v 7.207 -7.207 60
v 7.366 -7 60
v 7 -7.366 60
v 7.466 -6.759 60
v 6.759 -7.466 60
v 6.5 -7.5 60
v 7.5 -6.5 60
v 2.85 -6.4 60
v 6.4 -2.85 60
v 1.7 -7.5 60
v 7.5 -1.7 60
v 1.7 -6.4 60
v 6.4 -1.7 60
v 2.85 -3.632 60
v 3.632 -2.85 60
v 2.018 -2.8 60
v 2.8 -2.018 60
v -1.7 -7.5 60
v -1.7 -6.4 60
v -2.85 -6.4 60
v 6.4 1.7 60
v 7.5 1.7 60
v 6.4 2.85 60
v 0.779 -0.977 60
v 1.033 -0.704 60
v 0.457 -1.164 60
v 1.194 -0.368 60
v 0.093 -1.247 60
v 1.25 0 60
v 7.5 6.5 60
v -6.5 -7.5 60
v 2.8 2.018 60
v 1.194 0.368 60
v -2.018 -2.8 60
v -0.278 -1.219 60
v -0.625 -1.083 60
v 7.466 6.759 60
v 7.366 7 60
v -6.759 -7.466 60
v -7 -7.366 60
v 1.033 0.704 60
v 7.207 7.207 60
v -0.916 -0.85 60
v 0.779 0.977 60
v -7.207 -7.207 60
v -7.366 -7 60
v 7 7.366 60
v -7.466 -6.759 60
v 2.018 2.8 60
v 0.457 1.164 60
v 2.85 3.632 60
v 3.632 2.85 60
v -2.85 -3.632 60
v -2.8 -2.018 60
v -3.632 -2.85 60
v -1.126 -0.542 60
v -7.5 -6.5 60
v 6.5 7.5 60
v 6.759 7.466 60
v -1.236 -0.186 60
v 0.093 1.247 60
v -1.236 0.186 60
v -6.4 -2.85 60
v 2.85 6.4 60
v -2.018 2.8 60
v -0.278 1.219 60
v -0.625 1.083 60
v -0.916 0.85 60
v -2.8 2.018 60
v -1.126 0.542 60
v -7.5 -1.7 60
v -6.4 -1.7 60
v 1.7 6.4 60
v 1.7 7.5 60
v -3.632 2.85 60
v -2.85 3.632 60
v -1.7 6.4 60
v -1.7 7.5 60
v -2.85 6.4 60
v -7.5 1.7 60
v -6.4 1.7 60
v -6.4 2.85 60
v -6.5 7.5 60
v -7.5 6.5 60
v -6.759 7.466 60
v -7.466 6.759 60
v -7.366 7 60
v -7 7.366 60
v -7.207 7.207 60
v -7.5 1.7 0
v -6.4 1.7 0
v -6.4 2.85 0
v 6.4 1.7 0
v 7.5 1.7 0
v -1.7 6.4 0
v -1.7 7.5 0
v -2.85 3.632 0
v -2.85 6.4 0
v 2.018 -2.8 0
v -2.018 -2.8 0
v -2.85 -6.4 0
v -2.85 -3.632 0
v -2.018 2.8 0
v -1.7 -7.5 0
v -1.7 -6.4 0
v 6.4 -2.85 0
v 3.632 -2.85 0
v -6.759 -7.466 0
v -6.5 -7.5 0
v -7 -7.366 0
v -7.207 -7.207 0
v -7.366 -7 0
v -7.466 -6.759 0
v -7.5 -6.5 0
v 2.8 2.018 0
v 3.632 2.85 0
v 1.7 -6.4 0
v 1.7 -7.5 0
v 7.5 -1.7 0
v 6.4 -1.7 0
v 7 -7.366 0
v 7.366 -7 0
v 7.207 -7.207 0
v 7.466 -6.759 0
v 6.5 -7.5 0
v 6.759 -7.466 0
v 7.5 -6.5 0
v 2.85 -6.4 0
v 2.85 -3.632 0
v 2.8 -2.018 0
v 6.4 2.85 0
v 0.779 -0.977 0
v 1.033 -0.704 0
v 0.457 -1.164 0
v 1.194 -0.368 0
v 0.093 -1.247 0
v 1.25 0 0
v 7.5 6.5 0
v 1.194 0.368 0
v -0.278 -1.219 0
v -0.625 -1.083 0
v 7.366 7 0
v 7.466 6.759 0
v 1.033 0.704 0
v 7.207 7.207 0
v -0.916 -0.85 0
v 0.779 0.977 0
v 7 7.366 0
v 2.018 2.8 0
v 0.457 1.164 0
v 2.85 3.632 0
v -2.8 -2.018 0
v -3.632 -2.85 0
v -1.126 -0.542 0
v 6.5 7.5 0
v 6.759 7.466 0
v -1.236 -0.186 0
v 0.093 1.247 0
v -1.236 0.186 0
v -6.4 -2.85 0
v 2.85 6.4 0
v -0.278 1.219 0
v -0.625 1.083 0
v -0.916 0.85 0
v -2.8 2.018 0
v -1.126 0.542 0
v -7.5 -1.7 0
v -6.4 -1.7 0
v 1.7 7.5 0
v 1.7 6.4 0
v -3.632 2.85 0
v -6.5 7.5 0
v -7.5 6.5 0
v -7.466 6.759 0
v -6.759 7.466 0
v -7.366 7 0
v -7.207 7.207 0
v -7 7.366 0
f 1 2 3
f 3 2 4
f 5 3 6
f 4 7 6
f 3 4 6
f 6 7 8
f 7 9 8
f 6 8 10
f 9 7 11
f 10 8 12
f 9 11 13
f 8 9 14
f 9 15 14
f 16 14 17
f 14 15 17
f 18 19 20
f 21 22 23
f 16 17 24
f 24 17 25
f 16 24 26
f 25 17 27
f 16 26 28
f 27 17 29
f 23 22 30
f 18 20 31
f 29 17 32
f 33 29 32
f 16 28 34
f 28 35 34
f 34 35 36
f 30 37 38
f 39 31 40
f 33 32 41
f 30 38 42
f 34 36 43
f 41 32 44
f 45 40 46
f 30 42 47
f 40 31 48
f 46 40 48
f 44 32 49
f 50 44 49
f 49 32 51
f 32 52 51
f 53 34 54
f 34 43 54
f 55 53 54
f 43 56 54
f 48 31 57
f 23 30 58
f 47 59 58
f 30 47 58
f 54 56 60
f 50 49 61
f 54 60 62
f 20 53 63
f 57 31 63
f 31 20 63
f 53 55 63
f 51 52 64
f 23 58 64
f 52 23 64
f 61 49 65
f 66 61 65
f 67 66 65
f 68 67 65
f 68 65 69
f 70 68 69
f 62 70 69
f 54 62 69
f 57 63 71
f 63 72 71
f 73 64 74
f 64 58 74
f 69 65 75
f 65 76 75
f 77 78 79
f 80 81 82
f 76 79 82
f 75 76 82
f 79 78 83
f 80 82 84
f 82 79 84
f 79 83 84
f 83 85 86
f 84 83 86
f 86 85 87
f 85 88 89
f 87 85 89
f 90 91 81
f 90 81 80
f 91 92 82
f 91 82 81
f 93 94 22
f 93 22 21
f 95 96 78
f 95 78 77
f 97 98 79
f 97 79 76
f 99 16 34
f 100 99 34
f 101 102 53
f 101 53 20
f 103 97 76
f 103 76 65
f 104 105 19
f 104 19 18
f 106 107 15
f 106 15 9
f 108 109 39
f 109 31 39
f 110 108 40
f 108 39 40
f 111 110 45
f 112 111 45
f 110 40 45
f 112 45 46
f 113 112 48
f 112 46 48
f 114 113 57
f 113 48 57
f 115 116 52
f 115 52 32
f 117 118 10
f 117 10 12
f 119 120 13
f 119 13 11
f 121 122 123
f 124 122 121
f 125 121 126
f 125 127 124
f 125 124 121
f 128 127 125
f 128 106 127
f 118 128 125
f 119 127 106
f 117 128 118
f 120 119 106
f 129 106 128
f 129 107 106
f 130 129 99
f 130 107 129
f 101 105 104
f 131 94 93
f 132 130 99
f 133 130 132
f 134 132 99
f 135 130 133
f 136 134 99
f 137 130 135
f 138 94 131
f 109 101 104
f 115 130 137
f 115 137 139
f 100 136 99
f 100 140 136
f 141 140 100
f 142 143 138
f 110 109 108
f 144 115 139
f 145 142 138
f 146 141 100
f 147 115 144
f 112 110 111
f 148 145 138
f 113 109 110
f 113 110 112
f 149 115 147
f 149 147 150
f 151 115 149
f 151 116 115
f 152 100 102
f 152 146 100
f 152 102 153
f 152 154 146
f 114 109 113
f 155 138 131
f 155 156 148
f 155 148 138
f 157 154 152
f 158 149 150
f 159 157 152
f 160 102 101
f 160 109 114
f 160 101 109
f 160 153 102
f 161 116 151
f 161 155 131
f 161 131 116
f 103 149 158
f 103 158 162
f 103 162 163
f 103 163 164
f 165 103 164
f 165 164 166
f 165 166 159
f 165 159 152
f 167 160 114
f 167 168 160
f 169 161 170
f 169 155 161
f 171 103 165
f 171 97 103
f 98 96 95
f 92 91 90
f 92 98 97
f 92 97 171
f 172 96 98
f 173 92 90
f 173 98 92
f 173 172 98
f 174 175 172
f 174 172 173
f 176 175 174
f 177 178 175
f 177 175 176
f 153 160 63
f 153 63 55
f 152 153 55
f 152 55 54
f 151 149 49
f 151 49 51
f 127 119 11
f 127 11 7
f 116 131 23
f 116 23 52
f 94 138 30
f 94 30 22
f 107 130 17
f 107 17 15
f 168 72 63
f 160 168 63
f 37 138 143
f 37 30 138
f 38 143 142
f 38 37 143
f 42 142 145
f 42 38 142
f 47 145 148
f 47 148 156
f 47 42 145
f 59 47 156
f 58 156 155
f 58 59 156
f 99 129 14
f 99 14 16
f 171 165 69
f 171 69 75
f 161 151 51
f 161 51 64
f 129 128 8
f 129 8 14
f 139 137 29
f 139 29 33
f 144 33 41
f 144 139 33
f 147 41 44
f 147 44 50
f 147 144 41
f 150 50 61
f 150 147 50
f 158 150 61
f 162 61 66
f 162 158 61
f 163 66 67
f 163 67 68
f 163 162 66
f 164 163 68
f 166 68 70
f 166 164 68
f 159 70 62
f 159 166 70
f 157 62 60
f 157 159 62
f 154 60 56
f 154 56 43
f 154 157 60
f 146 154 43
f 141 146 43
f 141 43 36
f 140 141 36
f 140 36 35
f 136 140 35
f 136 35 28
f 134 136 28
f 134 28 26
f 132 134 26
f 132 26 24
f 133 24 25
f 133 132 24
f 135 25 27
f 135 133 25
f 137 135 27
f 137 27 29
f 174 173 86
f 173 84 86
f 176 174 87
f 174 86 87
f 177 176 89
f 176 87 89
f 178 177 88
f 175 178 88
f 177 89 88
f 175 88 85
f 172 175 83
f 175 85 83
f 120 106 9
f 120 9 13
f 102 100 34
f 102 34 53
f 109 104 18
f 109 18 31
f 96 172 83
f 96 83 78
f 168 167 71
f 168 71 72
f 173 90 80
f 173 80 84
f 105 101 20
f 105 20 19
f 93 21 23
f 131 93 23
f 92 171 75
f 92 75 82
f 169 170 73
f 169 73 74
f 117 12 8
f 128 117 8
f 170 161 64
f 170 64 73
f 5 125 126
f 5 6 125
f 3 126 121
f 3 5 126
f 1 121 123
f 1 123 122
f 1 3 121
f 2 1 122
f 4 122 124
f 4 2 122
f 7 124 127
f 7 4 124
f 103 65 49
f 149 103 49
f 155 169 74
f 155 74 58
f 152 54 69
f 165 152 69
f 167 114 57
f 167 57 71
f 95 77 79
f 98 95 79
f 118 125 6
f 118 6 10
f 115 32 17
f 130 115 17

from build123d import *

# Parameters (mm, degrees)
SKETCH1_R           = 1.25
BOSS_EXTRUDE1_DEPTH = 60
FILLET1_R           = 1


with BuildPart() as part:
    # Sketch1 → Boss-Extrude1 (new body)
    with BuildSketch(Plane.XY):
        Polygon((7.5, -7.5), (1.7, -7.5), (1.7, -6.4), (2.85, -6.4), (2.85, -3.63183498), (2.01816502, -2.8), (-2.01816502, -2.8), (-2.85, -3.63183498), (-2.85, -6.4), (-1.7, -6.4), (-1.7, -7.5), (-7.5, -7.5), (-7.5, -1.7), (-6.4, -1.7), (-6.4, -2.85), (-3.63183498, -2.85), (-2.8, -2.01816502), (-2.8, 2.01816502), (-3.63183498, 2.85), (-6.4, 2.85), (-6.4, 1.7), (-7.5, 1.7), (-7.5, 7.5), (-1.7, 7.5), (-1.7, 6.4), (-2.85, 6.4), (-2.85, 3.63183498), (-2.01816502, 2.8), (2.01816502, 2.8), (2.85, 3.63183498), (2.85, 6.4), (1.7, 6.4), (1.7, 7.5), (7.5, 7.5), (7.5, 1.7), (6.4, 1.7), (6.4, 2.85), (3.63183498, 2.85), (2.8, 2.01816502), (2.8, -2.01816502), (3.63183498, -2.85), (6.4, -2.85), (6.4, -1.7), (7.5, -1.7), align=None)
        Circle(SKETCH1_R, mode=Mode.SUBTRACT)
    extrude(amount=BOSS_EXTRUDE1_DEPTH)

    # Fillet1
    fillet1_edges = [part.edges().sort_by_distance(p)[0] for p in [
        (-7.5, 7.5, 30),
        (7.5, 7.5, 30),
        (7.5, -7.5, 30),
        (-7.5, -7.5, 30),
    ]]
    fillet(fillet1_edges, radius=FILLET1_R)


solid = part.part
